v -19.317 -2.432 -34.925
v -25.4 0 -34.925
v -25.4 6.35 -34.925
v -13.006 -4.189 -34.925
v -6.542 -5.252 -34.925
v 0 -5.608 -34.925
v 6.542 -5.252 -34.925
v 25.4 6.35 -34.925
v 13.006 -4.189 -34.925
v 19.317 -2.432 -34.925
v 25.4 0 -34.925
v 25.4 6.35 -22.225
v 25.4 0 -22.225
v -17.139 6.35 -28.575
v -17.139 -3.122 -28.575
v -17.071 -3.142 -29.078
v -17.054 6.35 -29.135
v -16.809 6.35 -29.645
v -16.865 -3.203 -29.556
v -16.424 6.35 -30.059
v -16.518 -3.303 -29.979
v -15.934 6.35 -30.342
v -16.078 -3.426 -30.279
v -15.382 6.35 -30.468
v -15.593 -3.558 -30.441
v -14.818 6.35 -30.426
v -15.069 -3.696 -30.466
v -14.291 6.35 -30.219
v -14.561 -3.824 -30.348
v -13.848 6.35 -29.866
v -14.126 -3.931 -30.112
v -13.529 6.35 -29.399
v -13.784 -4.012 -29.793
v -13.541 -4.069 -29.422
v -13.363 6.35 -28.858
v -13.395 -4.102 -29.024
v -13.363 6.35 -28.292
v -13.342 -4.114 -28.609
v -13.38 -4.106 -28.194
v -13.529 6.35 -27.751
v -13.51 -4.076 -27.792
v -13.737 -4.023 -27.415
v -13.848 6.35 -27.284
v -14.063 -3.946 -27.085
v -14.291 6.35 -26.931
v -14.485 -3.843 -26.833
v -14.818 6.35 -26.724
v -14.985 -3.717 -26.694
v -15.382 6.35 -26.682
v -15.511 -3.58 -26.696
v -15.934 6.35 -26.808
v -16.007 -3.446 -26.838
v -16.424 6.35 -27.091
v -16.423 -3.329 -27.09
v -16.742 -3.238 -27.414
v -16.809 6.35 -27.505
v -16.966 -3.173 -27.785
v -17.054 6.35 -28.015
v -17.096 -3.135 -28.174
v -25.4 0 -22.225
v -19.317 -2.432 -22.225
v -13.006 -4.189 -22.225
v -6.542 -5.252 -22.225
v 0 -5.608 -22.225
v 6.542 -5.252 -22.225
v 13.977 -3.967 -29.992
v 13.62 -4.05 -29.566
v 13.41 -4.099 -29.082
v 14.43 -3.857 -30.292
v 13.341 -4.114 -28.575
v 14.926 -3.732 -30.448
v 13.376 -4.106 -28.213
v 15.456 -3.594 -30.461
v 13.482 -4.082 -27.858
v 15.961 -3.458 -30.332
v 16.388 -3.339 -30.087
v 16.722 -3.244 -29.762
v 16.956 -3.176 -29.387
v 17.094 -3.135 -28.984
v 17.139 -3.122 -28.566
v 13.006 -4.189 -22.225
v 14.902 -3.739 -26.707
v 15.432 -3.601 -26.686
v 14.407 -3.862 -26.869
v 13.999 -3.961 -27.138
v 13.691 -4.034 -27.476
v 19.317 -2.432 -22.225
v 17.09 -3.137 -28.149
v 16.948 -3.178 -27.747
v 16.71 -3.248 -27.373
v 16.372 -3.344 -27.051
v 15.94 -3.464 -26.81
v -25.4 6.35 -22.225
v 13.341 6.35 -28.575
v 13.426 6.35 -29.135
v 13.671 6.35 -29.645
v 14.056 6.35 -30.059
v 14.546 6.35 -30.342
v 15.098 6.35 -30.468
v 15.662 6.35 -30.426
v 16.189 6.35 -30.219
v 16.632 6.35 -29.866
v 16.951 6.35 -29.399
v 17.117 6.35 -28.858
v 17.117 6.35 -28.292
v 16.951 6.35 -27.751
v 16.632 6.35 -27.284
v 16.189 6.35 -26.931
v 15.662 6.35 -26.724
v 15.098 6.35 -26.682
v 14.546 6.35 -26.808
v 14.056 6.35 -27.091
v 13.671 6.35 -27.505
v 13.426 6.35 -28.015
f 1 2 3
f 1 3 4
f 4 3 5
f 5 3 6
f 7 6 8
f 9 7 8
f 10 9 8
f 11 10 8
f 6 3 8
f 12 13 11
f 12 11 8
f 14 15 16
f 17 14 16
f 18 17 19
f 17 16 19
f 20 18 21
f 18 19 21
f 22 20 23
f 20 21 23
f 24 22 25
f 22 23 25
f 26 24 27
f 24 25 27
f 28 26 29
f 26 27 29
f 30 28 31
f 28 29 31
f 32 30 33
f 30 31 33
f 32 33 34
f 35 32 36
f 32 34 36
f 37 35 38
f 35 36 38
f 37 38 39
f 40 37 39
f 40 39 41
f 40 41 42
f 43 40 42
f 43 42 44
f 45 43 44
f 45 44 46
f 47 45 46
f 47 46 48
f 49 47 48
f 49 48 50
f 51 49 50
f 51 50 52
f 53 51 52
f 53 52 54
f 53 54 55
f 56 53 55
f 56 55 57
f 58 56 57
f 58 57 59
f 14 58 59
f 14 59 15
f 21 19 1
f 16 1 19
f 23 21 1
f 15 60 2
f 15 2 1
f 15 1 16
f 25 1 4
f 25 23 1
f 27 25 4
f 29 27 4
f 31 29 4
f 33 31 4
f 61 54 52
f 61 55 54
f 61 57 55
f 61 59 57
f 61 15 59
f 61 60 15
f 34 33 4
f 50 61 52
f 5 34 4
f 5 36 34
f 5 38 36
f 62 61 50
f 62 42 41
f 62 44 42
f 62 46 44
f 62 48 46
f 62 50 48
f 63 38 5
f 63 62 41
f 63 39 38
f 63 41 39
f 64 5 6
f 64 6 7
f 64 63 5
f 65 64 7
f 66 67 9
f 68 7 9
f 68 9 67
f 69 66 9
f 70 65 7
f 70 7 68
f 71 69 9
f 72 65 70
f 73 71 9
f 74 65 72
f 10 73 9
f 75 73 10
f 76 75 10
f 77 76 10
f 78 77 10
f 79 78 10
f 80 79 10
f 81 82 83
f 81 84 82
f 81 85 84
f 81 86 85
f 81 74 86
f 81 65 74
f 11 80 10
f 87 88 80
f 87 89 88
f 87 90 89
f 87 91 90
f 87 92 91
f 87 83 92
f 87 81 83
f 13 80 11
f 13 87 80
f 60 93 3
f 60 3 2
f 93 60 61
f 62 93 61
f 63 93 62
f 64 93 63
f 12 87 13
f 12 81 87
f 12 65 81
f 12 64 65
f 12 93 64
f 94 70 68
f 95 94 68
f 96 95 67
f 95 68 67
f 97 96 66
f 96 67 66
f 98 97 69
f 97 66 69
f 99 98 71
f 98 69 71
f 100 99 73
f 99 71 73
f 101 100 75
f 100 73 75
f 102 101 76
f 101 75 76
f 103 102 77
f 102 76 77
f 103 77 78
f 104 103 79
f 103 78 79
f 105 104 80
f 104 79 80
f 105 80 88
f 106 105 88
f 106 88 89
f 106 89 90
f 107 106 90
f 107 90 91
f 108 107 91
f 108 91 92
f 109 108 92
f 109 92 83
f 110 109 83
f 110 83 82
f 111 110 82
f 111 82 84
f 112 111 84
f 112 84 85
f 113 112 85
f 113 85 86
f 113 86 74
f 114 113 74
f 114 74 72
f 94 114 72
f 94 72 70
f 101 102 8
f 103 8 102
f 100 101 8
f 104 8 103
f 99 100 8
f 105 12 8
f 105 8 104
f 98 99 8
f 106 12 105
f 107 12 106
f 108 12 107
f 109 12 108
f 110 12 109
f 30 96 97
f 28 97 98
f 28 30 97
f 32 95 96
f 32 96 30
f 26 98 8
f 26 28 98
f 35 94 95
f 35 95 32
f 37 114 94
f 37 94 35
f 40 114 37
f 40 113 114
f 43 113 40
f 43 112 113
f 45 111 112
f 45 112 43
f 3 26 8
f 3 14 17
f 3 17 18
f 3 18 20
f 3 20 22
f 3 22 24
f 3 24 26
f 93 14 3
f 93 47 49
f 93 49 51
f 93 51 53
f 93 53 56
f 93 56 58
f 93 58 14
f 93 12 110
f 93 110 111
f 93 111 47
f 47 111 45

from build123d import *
from build123d.topology import SkipClean

# Parameters (mm, degrees)
SKETCH1_W              = 50.8
SKETCH1_H              = 44.45
BOSS_EXTRUDE1_DEPTH    = 6.35
BOSS_EXTRUDE2_DEPTH    = 44.45
M4X0_7_TAPPED_HOLE1_D  = 3.3
BOSS_EXTRUDE3_DEPTH    = 12.7
F_10_24_TAPPED_HOLE1_D = 3.7973
SKETCH10_W             = 50.8
SKETCH10_H             = 44.45
CUT_EXTRUDE1_DEPTH     = 25.4


with BuildPart() as part:
    # Sketch1 → Boss-Extrude1 (new body)
    with BuildSketch(Plane(origin=(0, 0, 0), x_dir=(1, 0, 0), z_dir=(0, 1, 0))):
        Rectangle(SKETCH1_W, SKETCH1_H)
    extrude(amount=BOSS_EXTRUDE1_DEPTH)

    # Sketch2 → Boss-Extrude2 (add)
    with BuildSketch(Plane.XY.offset(22.225)):
        with BuildLine():
            Line((-25.4, 0), (25.4, 0))
            ThreePointArc((25.4, 0), (0, -5.608040792), (-25.4, 0))
        make_face()
    extrude(amount=-BOSS_EXTRUDE2_DEPTH)

    # M4x0.7 Tapped Hole1 (through all)
    with Locations(Plane(origin=(0, 6.35, 0), x_dir=(1, 0, 0), z_dir=(0, 1, 0))):
        with Locations((0, 14.6499912), (-17.9500022, -14.6500088), (17.9499978, -14.6500088)):
            Hole(M4X0_7_TAPPED_HOLE1_D / 2)

    # Sketch6 → Boss-Extrude3 (add)
    with SkipClean():  # the faces are left unmerged after this step: merging them gives an invalid solid
        with BuildSketch(Plane(origin=(0, 0, -22.225), x_dir=(-1, 0, 0), z_dir=(0, 0, -1))):
            with BuildLine():
                Line((-25.4, 6.35), (25.4, 6.35))
                Line((25.4, 6.35), (25.4, 0))
                ThreePointArc((25.4, 0), (0, -5.608040792), (-25.4, 0))
                Line((-25.4, 0), (-25.4, 6.35))
            make_face()
        extrude(amount=BOSS_EXTRUDE3_DEPTH)

    # #10-24 Tapped Hole1 (through all)
    with Locations(Plane(origin=(0, 6.35, 0), x_dir=(1, 0, 0), z_dir=(0, 1, 0))):
        with Locations((-15.24, 28.575), (15.24, 28.575)):
            Hole(F_10_24_TAPPED_HOLE1_D / 2)

    # Sketch10 → Cut-Extrude1 (cut)
    with BuildSketch(Plane(origin=(0, 6.35, 0), x_dir=(1, 0, 0), z_dir=(0, 1, 0))):
        Rectangle(SKETCH10_W, SKETCH10_H)
    extrude(amount=-CUT_EXTRUDE1_DEPTH, mode=Mode.SUBTRACT)


solid = part.part
